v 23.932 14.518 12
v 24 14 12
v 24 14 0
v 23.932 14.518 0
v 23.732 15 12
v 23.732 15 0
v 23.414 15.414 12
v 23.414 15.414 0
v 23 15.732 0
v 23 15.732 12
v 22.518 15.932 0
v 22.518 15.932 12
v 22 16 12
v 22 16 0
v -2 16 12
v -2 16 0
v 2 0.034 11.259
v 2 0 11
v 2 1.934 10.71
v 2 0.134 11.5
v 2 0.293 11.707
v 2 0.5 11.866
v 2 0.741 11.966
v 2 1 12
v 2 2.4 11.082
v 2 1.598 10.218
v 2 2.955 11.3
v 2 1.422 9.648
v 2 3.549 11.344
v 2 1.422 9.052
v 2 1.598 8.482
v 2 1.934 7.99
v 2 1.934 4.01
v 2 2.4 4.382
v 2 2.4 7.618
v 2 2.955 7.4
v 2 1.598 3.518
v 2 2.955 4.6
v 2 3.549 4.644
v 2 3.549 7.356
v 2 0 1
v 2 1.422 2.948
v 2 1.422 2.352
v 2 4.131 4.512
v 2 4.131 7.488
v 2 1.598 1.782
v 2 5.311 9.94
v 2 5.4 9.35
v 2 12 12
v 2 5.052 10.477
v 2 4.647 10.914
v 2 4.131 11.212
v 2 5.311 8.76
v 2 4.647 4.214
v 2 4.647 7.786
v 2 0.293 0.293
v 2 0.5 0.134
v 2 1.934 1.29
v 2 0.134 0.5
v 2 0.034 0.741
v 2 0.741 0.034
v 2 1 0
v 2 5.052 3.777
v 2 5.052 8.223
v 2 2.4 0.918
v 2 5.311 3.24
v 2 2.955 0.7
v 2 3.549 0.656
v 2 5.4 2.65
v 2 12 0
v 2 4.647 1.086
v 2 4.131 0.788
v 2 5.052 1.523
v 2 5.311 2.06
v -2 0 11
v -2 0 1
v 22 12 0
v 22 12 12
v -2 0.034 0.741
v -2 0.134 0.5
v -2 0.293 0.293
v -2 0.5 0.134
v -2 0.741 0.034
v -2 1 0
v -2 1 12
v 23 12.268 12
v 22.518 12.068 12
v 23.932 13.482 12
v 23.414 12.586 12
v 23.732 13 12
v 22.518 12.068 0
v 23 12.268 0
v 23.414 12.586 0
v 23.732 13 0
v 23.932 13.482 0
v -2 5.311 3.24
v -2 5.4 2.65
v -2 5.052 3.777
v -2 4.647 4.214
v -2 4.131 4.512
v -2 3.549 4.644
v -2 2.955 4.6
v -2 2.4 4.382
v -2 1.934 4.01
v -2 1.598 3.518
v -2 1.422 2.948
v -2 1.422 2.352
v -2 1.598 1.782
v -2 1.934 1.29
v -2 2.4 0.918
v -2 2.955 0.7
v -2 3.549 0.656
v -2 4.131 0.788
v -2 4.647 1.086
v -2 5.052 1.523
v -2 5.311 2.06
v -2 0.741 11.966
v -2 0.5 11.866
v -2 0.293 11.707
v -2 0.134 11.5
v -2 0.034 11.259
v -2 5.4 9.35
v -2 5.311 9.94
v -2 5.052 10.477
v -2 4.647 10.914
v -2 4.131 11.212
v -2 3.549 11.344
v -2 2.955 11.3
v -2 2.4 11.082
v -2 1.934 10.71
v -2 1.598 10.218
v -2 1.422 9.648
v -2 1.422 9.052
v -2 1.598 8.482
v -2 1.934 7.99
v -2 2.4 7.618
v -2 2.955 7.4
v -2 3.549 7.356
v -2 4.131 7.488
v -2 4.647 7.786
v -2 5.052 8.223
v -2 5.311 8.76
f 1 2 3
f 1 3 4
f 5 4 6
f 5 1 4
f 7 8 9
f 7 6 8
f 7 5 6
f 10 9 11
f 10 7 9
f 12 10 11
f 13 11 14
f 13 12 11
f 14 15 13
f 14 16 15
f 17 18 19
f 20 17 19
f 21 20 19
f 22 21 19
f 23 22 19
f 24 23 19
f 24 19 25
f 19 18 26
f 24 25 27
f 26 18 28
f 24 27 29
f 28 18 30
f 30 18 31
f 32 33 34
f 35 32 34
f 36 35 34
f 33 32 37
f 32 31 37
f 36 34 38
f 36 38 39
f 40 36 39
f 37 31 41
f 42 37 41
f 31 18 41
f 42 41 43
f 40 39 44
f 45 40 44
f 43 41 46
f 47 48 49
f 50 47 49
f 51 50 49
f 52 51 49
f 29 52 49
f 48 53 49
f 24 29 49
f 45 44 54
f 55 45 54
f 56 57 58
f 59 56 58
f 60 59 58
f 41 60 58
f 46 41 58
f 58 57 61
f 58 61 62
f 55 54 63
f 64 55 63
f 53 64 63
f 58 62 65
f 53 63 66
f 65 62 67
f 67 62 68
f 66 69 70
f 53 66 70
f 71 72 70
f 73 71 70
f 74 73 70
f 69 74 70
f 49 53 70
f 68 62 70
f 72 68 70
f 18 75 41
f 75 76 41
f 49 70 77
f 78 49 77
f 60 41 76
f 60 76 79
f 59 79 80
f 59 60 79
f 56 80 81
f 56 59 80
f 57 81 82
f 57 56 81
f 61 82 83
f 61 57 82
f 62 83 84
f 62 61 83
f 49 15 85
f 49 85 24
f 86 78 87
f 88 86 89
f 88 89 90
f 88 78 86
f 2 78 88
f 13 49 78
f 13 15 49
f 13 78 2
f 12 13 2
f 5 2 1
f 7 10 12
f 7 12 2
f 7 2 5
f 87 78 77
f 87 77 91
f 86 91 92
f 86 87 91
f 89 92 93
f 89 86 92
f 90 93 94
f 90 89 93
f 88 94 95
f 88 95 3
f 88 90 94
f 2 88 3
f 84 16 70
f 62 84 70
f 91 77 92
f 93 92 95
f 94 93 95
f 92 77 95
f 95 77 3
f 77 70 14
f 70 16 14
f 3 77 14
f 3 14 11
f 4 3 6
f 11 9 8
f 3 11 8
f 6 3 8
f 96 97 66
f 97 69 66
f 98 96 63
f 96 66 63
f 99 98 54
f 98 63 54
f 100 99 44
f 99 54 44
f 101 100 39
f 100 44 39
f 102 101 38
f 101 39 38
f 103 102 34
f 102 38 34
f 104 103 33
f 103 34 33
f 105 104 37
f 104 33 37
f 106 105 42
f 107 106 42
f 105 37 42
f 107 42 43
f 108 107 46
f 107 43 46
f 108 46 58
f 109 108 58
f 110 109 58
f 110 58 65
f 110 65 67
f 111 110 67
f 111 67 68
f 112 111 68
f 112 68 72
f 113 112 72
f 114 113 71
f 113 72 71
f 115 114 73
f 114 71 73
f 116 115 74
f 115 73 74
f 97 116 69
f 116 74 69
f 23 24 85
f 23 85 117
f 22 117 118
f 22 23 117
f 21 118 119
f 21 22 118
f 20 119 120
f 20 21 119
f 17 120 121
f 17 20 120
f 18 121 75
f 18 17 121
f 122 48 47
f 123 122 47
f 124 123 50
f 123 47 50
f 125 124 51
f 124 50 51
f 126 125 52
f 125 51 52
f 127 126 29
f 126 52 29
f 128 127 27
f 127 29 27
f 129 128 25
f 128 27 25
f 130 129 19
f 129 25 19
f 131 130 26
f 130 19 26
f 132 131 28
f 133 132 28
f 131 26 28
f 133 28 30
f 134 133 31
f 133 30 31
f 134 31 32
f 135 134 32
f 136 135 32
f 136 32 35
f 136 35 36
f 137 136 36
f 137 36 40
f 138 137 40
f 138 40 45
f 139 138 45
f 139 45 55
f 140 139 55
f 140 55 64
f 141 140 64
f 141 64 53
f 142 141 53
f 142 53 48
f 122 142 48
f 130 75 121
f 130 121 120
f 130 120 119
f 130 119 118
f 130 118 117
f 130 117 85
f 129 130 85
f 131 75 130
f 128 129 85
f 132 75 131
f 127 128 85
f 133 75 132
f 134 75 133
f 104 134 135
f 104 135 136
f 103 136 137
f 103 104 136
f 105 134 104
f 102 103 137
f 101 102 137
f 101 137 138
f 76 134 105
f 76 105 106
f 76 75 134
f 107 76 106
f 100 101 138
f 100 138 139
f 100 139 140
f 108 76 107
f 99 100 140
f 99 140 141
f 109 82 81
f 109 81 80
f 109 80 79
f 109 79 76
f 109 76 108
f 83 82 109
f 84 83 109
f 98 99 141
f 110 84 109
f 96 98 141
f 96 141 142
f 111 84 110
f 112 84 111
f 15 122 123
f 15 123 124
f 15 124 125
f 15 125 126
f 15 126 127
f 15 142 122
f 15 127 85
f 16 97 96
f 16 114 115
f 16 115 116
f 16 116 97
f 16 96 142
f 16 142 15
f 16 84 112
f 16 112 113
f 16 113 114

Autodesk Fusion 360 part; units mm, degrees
sketch "Skizze1" plane through (0, 0, 0) normal (0, 0, 1) x (1, 0, 0)
  line L0 (2, 12) -> (24, 12)
  line L1 (-2, 16) -> (24, 16)
  line L2 (24, 16) -> (24, 12)
  line L3 (2, 0) -> (2, 12)
  line L4 (-2, 0) -> (-2, 16)
  line L5 (-2, 0) -> (2, 0)
extrude "Extrusion1" add sketch "Skizze1" along normal blind 12
sketch "Skizze2" plane through (2, 0, 0) normal (1, 0, 0) x (0, 1, 0)
  line L0 (0, 0) -> (12, 0)
  line L1 (12, 0) -> (12, 12)
  line L2 (12, 12) -> (0, 12)
  line L3 (0, 12) -> (0, 0)
  circle A0 centre (3.4, 9.35) radius 2
  circle A1 centre (3.4, 2.65) radius 2
  dimension "d11" = 4
  dimension "d13" = 4
extrude "Extrusion2" cut sketch "Skizze2" against normal blind 12 contours A0 | A1
fillet "Abrundung1" radius 2 2 edges at (24, 16, 6) (24, 12, 6)
fillet "Abrundung2" radius 1 2 edges at (0, 0, 12) (0, 0, 0)
